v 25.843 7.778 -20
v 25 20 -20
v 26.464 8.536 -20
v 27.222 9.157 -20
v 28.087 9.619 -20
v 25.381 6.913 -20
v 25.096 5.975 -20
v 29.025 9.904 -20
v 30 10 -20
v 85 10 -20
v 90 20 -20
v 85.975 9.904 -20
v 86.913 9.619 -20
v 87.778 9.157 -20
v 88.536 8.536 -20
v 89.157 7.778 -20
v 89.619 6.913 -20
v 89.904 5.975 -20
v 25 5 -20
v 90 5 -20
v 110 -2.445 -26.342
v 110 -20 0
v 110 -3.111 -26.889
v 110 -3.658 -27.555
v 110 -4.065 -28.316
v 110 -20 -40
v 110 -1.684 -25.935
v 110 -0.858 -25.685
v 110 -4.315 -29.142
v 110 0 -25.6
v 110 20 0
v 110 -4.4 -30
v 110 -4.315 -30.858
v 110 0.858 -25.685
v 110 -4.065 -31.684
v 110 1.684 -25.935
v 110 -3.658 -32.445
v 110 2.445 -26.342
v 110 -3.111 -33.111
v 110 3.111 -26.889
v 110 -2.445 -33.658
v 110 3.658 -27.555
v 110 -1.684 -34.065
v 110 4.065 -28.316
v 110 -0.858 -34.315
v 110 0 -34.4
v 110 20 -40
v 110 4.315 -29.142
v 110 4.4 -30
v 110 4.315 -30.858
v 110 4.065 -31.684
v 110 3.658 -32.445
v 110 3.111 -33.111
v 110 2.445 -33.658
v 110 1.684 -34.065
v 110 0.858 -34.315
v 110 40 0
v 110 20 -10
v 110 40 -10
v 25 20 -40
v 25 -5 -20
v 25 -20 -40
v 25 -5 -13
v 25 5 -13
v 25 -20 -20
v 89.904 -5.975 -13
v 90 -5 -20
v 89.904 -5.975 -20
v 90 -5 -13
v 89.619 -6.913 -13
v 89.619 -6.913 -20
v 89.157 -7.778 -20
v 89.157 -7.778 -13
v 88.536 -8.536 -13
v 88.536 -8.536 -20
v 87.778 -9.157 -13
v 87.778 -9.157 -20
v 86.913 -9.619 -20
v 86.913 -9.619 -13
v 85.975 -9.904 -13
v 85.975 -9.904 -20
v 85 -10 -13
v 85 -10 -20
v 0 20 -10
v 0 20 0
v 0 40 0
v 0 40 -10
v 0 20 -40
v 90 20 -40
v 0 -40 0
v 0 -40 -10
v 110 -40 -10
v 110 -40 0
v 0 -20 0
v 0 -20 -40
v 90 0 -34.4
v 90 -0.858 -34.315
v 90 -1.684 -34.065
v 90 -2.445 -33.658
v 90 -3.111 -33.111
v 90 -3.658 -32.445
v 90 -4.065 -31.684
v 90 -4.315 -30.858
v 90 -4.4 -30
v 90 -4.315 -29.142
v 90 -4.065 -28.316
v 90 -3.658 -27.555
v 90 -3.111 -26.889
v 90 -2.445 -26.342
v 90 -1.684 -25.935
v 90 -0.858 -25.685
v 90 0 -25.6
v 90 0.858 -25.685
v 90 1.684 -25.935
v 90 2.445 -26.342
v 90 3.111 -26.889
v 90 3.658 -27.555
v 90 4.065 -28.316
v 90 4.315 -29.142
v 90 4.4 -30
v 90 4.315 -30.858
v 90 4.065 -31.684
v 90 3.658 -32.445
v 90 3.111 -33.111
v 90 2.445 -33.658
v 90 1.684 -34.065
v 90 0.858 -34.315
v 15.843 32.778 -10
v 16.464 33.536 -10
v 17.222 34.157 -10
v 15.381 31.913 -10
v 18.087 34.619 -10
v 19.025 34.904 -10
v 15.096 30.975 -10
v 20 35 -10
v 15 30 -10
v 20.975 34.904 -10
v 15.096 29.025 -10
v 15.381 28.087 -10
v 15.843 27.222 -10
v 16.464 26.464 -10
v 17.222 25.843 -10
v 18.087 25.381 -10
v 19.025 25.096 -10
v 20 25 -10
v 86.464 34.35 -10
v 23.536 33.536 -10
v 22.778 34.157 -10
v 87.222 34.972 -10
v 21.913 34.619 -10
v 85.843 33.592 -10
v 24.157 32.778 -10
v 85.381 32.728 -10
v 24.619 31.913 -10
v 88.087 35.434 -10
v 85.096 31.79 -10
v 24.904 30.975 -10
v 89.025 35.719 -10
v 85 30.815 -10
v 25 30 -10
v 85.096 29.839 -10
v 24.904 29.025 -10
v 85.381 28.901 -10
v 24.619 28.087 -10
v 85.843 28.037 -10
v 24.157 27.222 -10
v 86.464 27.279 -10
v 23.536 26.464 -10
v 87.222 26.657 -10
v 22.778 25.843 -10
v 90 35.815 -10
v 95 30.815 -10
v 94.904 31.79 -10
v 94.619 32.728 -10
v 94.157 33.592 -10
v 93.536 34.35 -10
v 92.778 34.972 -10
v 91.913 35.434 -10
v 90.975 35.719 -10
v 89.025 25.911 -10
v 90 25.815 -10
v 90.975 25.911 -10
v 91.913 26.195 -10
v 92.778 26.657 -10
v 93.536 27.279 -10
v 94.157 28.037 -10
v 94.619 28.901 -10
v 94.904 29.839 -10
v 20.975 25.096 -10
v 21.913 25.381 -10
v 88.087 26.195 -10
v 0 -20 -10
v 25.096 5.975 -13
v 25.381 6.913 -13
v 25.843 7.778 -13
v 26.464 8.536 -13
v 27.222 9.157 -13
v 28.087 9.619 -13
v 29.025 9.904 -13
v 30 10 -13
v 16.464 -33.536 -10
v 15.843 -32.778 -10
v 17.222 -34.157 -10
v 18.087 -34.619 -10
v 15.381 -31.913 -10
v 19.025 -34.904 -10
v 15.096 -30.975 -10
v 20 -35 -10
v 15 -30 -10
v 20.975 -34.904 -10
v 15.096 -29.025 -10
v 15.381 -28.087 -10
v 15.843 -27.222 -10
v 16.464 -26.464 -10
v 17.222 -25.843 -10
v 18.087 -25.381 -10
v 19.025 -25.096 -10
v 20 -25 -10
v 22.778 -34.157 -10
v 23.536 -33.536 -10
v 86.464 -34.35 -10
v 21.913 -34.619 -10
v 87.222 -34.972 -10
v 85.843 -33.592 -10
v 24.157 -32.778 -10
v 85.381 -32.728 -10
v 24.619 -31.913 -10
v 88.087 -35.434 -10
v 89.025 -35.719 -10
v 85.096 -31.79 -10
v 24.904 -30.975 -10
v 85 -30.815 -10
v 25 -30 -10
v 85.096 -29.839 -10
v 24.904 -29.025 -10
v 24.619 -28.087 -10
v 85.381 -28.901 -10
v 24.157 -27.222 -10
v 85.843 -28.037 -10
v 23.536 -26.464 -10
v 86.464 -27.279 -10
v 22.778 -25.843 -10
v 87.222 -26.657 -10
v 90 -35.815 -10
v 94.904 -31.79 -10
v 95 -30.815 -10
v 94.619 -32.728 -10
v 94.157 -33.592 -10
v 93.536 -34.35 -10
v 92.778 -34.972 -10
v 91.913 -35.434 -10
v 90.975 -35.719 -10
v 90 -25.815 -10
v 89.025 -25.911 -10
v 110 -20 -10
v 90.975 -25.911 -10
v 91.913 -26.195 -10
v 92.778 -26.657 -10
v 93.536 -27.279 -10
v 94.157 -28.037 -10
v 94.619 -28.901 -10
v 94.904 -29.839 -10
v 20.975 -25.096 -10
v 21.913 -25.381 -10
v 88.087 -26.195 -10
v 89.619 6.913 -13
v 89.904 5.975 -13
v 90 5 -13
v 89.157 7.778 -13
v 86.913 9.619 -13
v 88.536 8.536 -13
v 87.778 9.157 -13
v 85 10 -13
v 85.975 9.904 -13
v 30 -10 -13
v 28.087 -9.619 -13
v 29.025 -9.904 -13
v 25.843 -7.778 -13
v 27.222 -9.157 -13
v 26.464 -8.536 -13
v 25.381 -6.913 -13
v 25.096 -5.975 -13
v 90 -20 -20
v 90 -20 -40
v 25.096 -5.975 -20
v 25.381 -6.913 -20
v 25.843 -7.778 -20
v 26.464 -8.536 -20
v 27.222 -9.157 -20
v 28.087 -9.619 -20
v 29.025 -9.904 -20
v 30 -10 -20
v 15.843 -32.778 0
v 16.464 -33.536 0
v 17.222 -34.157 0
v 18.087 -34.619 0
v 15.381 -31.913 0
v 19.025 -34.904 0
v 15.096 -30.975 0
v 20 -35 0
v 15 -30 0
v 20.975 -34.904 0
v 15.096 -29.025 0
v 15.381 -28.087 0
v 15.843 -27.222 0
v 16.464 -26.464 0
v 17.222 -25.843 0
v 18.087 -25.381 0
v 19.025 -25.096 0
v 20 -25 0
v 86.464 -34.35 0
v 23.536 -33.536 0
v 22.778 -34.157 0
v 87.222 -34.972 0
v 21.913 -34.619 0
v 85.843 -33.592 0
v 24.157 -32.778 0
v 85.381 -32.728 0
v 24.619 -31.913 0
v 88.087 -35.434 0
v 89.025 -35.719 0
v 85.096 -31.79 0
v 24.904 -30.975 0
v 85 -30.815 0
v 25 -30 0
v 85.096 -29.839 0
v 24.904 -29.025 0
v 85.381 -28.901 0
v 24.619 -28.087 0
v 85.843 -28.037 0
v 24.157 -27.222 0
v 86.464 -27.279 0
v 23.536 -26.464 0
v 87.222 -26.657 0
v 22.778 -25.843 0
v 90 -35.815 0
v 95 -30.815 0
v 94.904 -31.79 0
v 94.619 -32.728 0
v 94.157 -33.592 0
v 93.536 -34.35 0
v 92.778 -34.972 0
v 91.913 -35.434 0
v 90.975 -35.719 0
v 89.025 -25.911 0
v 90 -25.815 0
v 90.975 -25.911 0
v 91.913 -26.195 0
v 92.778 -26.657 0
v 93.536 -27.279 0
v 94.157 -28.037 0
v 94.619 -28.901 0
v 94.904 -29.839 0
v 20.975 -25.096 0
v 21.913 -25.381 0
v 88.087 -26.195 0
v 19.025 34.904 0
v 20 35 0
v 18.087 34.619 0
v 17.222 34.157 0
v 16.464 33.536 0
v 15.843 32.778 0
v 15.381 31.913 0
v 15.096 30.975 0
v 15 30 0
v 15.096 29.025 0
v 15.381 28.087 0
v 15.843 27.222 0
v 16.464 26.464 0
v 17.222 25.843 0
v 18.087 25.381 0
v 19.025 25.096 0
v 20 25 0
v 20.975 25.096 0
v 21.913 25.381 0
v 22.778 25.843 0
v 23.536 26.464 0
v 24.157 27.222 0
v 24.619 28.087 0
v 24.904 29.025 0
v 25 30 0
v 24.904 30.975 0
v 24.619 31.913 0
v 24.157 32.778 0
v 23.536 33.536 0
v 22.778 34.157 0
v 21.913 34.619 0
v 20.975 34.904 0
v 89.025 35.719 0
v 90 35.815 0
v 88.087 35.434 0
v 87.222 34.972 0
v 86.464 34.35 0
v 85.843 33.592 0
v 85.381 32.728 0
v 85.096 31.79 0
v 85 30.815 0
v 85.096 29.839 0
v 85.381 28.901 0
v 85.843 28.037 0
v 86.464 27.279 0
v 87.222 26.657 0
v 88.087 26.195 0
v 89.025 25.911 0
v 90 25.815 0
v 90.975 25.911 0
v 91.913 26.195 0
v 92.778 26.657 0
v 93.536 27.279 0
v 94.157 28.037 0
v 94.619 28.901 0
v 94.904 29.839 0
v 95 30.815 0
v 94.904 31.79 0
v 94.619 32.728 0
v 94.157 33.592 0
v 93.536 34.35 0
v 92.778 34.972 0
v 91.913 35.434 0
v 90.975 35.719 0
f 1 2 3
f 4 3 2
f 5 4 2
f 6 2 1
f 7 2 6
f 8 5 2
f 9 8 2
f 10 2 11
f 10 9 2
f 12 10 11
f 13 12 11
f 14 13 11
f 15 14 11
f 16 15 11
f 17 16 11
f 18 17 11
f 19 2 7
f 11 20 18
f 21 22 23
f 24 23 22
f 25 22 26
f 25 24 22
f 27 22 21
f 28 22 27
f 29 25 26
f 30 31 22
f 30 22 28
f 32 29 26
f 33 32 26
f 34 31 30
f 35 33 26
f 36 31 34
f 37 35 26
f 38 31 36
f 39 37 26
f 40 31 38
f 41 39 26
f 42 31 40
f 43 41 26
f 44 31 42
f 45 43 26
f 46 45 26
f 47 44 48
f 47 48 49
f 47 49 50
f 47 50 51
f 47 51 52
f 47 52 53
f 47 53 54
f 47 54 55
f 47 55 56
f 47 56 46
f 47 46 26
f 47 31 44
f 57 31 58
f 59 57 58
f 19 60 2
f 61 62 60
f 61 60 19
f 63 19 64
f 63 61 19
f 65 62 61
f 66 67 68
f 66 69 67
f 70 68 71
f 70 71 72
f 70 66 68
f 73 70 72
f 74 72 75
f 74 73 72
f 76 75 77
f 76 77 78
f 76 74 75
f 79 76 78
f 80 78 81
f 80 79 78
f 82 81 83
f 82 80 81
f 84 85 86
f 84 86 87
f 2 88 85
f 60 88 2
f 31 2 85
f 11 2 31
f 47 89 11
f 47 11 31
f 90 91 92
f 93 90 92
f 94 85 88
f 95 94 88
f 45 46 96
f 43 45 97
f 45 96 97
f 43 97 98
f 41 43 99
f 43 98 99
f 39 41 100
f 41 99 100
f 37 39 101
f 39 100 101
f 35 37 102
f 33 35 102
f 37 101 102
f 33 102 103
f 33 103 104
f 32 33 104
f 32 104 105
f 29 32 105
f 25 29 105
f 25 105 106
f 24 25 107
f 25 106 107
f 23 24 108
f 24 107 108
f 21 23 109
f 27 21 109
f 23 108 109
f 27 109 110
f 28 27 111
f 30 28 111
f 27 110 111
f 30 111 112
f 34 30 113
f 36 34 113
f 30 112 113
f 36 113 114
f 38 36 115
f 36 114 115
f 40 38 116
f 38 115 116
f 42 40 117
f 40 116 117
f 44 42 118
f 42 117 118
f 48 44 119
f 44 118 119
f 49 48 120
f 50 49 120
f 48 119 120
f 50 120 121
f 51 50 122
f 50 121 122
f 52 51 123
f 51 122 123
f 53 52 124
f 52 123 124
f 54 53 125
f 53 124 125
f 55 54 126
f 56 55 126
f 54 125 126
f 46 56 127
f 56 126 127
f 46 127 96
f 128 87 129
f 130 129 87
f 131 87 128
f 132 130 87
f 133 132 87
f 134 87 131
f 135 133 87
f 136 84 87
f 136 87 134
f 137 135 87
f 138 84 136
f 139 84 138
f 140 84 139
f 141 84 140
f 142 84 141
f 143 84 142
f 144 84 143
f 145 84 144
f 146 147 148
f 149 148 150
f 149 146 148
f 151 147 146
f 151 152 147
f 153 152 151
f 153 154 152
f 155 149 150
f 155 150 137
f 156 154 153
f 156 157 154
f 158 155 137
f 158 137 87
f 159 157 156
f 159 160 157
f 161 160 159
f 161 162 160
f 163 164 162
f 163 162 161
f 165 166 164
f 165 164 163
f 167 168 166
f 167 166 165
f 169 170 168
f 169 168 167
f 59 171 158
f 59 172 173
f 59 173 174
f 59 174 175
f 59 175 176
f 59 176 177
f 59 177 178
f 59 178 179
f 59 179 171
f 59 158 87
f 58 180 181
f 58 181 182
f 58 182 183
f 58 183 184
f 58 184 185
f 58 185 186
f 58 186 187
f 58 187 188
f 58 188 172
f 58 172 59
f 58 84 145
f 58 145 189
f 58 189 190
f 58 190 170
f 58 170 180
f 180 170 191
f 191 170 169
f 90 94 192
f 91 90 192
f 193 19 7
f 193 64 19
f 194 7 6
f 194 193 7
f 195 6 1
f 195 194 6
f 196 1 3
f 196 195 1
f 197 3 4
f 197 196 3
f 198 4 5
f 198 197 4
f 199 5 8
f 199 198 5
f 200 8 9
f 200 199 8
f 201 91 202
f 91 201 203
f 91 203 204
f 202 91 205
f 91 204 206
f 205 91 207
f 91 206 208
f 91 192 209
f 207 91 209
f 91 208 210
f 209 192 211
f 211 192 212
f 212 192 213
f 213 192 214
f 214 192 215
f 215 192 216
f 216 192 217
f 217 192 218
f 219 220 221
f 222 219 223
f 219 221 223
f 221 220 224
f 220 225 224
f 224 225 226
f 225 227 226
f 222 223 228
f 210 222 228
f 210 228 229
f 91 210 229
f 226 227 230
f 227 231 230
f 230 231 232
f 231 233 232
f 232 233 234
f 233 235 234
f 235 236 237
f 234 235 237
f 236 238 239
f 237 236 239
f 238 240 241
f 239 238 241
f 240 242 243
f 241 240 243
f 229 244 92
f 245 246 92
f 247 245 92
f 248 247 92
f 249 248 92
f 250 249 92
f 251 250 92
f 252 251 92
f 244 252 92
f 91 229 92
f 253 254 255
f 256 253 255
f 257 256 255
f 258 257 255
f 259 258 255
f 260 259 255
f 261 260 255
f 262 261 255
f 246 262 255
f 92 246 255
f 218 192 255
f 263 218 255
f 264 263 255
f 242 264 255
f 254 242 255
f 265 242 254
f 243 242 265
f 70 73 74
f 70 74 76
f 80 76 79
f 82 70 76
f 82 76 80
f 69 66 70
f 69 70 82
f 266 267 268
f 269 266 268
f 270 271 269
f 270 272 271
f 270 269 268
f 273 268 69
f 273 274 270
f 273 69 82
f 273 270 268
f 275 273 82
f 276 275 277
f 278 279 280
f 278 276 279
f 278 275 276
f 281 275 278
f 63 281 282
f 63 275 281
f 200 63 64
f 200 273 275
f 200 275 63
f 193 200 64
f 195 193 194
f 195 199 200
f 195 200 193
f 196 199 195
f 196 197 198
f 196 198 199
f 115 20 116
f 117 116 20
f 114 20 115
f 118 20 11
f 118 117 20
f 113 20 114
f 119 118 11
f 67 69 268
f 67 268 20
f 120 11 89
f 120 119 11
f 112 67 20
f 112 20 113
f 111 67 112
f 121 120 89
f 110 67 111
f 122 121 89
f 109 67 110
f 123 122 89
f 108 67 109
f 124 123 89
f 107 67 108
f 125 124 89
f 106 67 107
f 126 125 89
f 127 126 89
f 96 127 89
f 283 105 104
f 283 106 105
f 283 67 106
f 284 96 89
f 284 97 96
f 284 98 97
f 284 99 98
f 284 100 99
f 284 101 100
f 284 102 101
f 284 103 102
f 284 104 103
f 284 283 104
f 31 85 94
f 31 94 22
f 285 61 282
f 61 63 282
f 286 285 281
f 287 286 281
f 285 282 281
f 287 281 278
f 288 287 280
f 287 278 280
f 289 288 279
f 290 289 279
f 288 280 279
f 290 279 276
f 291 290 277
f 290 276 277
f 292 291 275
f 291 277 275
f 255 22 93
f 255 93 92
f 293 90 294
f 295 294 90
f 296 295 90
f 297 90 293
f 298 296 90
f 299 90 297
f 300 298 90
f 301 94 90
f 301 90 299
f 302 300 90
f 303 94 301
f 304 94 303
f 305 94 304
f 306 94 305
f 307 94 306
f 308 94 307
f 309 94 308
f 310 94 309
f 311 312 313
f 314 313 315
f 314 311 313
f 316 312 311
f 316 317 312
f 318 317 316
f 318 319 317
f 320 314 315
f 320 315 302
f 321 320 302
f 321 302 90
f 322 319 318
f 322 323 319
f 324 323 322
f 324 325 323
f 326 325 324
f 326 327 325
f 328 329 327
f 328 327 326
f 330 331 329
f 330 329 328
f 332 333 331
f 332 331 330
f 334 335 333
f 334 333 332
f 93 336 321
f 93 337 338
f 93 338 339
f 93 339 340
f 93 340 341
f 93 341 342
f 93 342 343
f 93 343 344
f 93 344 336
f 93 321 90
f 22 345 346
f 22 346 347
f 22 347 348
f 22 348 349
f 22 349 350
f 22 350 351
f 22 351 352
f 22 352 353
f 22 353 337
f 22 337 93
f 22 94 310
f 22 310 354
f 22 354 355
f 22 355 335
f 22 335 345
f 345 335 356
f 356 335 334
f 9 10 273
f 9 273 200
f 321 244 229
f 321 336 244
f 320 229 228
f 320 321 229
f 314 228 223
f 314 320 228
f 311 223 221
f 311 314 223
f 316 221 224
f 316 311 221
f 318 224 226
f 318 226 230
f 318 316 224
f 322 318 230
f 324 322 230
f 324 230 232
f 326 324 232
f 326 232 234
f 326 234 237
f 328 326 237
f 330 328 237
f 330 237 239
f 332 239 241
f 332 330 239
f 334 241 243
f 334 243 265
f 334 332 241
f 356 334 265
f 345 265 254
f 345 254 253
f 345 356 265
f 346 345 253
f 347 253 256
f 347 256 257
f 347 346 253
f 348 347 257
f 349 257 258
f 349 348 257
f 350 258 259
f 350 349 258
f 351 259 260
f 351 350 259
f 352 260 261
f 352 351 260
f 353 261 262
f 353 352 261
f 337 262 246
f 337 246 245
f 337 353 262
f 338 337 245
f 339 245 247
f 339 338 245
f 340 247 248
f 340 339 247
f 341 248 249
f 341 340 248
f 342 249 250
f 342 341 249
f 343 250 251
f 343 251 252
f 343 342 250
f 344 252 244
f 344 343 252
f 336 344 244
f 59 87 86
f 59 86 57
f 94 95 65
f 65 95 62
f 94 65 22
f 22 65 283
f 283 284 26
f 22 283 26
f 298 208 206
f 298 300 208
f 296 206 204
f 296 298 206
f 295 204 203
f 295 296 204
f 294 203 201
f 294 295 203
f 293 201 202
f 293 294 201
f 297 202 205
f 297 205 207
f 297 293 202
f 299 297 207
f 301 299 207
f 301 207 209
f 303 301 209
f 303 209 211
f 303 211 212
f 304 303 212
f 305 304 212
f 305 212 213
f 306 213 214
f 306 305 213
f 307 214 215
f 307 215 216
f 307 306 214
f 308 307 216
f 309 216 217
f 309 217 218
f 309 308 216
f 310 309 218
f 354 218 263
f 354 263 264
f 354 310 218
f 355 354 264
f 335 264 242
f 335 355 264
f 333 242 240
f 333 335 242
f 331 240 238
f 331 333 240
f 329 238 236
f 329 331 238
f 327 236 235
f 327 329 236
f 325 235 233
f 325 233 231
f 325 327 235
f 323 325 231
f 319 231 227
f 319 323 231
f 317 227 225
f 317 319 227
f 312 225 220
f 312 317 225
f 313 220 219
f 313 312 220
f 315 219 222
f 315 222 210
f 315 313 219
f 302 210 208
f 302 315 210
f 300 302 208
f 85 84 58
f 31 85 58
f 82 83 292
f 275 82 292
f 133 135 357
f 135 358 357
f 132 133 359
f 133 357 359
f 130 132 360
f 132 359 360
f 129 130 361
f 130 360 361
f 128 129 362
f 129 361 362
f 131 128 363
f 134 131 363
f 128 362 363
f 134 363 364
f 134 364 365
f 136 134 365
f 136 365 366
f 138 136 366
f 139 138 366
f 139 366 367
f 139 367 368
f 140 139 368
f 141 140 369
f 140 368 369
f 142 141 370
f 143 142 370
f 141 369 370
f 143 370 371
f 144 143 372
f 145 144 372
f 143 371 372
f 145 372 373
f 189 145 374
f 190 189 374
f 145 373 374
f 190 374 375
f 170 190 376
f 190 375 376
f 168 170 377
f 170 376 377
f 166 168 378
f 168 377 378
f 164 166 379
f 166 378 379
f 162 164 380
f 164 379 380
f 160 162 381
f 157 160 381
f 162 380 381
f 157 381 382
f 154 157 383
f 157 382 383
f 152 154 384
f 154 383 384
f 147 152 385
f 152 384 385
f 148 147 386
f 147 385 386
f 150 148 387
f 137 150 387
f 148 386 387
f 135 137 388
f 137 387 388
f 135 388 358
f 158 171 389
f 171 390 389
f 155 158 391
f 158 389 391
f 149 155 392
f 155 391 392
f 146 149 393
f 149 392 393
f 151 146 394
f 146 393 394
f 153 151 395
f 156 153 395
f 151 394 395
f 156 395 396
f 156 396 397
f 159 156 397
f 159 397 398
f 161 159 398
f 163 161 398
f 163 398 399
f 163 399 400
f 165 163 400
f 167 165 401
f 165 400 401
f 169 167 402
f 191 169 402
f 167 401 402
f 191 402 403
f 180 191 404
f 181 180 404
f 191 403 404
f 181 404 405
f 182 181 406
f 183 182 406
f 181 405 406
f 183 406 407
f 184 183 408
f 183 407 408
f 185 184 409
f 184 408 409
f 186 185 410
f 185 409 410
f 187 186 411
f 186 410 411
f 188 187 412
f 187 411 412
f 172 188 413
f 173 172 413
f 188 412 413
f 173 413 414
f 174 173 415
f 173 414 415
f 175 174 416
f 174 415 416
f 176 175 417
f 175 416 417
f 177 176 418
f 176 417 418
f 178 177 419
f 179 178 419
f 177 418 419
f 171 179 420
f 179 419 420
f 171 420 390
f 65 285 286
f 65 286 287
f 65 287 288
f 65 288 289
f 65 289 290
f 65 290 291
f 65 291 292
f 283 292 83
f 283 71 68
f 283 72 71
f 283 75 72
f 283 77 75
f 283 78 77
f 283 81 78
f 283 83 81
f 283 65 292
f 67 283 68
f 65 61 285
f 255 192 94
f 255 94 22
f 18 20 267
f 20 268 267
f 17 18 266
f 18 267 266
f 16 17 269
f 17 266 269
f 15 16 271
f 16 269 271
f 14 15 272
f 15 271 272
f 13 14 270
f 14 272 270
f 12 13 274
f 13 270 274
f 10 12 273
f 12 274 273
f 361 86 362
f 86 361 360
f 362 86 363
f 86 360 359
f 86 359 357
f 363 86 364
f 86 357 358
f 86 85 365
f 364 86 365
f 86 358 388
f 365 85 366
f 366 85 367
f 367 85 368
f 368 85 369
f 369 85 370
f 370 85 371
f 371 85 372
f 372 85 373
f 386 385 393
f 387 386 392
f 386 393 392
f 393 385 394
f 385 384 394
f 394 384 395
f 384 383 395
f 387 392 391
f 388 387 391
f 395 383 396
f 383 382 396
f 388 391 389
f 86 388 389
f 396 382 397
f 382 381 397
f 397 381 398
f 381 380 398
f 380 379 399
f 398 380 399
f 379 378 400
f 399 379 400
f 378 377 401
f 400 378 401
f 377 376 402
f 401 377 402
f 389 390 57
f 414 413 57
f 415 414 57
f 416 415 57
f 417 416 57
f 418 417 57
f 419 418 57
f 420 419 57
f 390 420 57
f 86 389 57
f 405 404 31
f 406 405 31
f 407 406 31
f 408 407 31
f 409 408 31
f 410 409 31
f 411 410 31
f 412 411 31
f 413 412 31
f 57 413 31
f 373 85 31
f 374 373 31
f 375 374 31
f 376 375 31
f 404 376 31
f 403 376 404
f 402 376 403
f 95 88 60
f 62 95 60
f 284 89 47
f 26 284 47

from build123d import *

# Parameters (mm, degrees)
SKETCH3_W                     = 110
SKETCH3_H                     = 40
BOSS_EXTRUDE2_DEPTH           = 20
SPLIT2_SURFACE_1_BACK         = 124.693
SPLIT2_SURFACE_1_DEPTH        = 249.386
SKETCH6_W                     = 110
SKETCH6_H                     = 10
BOSS_EXTRUDE3_DEPTH           = 20
SKETCH9_W                     = 5
SKETCH9_H                     = 10
M8_CLEARANCE_HOLE1_AT_2_COUNT = 2
M8_CLEARANCE_HOLE1_AT_2_PITCH = 70.004739842
SKETCH10_W                    = 65
SKETCH10_H                    = 20
CUT_EXTRUDE1_DEPTH            = 7
FILLET1_R                     = 5
SKETCH15_W                    = 4.4
SKETCH15_H                    = 20.001


with BuildPart() as part:
    # Sketch3 → Boss-Extrude2 (new, symmetric)
    with BuildSketch(Plane(origin=(0, 0, 0), x_dir=(1, 0, 0), z_dir=(0, 1, 0))):
        with Locations((55, 20)):
            Rectangle(SKETCH3_W, SKETCH3_H)
    extrude(amount=BOSS_EXTRUDE2_DEPTH, both=True)

    # Split2: cut with a surface, the side behind it stays
    # Split2 surface: a surface, the sketch's curves swept straight by 249.386 mm
    with BuildLine(Plane(origin=(0, 0, 0), x_dir=(1, 0, 0), z_dir=(0, 1, 0)).offset(-SPLIT2_SURFACE_1_BACK), mode=Mode.PRIVATE) as split2_surface_1_path:
        Line((25, 50.385249654), (25, 20))
        Line((25, 20), (90, 20))
        Line((90, 20), (90, 48.537928397))
    split2_surface_1 = Shell.extrude(split2_surface_1_path.wire(), (0 * SPLIT2_SURFACE_1_DEPTH, 1 * SPLIT2_SURFACE_1_DEPTH, 0 * SPLIT2_SURFACE_1_DEPTH))
    split(bisect_by=split2_surface_1, keep=Keep.BOTTOM)

    # Sketch10 → Cut-Extrude1 (cut)
    with BuildSketch(Plane(origin=(0, 0, -20), x_dir=(-1, 0, 0), z_dir=(0, 0, -1))):
        with Locations((-57.5, 0)):
            Rectangle(SKETCH10_W, SKETCH10_H)
    extrude(amount=-CUT_EXTRUDE1_DEPTH, mode=Mode.SUBTRACT)

    # Fillet1
    fillet1_edges = [part.edges().sort_by_distance(p)[0] for p in [
        (25, 10, -16.5),
        (25, -10, -16.5),
        (90, -10, -16.5),
        (90, 10, -16.5),
    ]]
    fillet(fillet1_edges, radius=FILLET1_R)

    # Sketch15 → M10x1.25 Tapped Hole1 (revolve, cut)
    with BuildSketch(Plane(origin=(110, 0, -30), x_dir=(0, 0, -1), z_dir=(0, 1, 0))):
        with Locations((2.2, 10.0005)):
            Rectangle(SKETCH15_W, SKETCH15_H)
    revolve(axis=Axis((116.35, 0, -30), (-1, 0, 0)), mode=Mode.SUBTRACT)


with BuildPart() as body_2:
    # Sketch6 → Boss-Extrude3 (new body)
    with BuildSketch(Plane(origin=(0, 20, 0), x_dir=(1, 0, 0), z_dir=(0, 1, 0))):
        with Locations((55, 5)):
            Rectangle(SKETCH6_W, SKETCH6_H)
    extrude(amount=BOSS_EXTRUDE3_DEPTH)

    # Sketch9 → M8 Clearance Hole1 (revolve, cut)
    with BuildSketch(Plane(origin=(20, 30, -10), x_dir=(0, 1, 0), z_dir=(1, 0, 0))):
        with Locations((2.5, 5)):
            Rectangle(SKETCH9_W, SKETCH9_H)
    m8_clearance_hole1 = revolve(axis=Axis((20, 30, -16.35), (0, 0, 1)), mode=Mode.SUBTRACT)

    # M8 Clearance Hole1 at 2: M8 Clearance Hole1 ×2
    with Locations(*[Vector(0.9999322925508326, 0.01163659374714847, 0) * (i * M8_CLEARANCE_HOLE1_AT_2_PITCH) for i in range(1, M8_CLEARANCE_HOLE1_AT_2_COUNT)]):
        add(m8_clearance_hole1, mode=Mode.SUBTRACT)


with BuildPart() as body_3:
    # Mirror1: mirrored copy
    add(body_2.part.mirror(Plane.ZX))


solid = Compound([part.part, body_2.part, body_3.part])
